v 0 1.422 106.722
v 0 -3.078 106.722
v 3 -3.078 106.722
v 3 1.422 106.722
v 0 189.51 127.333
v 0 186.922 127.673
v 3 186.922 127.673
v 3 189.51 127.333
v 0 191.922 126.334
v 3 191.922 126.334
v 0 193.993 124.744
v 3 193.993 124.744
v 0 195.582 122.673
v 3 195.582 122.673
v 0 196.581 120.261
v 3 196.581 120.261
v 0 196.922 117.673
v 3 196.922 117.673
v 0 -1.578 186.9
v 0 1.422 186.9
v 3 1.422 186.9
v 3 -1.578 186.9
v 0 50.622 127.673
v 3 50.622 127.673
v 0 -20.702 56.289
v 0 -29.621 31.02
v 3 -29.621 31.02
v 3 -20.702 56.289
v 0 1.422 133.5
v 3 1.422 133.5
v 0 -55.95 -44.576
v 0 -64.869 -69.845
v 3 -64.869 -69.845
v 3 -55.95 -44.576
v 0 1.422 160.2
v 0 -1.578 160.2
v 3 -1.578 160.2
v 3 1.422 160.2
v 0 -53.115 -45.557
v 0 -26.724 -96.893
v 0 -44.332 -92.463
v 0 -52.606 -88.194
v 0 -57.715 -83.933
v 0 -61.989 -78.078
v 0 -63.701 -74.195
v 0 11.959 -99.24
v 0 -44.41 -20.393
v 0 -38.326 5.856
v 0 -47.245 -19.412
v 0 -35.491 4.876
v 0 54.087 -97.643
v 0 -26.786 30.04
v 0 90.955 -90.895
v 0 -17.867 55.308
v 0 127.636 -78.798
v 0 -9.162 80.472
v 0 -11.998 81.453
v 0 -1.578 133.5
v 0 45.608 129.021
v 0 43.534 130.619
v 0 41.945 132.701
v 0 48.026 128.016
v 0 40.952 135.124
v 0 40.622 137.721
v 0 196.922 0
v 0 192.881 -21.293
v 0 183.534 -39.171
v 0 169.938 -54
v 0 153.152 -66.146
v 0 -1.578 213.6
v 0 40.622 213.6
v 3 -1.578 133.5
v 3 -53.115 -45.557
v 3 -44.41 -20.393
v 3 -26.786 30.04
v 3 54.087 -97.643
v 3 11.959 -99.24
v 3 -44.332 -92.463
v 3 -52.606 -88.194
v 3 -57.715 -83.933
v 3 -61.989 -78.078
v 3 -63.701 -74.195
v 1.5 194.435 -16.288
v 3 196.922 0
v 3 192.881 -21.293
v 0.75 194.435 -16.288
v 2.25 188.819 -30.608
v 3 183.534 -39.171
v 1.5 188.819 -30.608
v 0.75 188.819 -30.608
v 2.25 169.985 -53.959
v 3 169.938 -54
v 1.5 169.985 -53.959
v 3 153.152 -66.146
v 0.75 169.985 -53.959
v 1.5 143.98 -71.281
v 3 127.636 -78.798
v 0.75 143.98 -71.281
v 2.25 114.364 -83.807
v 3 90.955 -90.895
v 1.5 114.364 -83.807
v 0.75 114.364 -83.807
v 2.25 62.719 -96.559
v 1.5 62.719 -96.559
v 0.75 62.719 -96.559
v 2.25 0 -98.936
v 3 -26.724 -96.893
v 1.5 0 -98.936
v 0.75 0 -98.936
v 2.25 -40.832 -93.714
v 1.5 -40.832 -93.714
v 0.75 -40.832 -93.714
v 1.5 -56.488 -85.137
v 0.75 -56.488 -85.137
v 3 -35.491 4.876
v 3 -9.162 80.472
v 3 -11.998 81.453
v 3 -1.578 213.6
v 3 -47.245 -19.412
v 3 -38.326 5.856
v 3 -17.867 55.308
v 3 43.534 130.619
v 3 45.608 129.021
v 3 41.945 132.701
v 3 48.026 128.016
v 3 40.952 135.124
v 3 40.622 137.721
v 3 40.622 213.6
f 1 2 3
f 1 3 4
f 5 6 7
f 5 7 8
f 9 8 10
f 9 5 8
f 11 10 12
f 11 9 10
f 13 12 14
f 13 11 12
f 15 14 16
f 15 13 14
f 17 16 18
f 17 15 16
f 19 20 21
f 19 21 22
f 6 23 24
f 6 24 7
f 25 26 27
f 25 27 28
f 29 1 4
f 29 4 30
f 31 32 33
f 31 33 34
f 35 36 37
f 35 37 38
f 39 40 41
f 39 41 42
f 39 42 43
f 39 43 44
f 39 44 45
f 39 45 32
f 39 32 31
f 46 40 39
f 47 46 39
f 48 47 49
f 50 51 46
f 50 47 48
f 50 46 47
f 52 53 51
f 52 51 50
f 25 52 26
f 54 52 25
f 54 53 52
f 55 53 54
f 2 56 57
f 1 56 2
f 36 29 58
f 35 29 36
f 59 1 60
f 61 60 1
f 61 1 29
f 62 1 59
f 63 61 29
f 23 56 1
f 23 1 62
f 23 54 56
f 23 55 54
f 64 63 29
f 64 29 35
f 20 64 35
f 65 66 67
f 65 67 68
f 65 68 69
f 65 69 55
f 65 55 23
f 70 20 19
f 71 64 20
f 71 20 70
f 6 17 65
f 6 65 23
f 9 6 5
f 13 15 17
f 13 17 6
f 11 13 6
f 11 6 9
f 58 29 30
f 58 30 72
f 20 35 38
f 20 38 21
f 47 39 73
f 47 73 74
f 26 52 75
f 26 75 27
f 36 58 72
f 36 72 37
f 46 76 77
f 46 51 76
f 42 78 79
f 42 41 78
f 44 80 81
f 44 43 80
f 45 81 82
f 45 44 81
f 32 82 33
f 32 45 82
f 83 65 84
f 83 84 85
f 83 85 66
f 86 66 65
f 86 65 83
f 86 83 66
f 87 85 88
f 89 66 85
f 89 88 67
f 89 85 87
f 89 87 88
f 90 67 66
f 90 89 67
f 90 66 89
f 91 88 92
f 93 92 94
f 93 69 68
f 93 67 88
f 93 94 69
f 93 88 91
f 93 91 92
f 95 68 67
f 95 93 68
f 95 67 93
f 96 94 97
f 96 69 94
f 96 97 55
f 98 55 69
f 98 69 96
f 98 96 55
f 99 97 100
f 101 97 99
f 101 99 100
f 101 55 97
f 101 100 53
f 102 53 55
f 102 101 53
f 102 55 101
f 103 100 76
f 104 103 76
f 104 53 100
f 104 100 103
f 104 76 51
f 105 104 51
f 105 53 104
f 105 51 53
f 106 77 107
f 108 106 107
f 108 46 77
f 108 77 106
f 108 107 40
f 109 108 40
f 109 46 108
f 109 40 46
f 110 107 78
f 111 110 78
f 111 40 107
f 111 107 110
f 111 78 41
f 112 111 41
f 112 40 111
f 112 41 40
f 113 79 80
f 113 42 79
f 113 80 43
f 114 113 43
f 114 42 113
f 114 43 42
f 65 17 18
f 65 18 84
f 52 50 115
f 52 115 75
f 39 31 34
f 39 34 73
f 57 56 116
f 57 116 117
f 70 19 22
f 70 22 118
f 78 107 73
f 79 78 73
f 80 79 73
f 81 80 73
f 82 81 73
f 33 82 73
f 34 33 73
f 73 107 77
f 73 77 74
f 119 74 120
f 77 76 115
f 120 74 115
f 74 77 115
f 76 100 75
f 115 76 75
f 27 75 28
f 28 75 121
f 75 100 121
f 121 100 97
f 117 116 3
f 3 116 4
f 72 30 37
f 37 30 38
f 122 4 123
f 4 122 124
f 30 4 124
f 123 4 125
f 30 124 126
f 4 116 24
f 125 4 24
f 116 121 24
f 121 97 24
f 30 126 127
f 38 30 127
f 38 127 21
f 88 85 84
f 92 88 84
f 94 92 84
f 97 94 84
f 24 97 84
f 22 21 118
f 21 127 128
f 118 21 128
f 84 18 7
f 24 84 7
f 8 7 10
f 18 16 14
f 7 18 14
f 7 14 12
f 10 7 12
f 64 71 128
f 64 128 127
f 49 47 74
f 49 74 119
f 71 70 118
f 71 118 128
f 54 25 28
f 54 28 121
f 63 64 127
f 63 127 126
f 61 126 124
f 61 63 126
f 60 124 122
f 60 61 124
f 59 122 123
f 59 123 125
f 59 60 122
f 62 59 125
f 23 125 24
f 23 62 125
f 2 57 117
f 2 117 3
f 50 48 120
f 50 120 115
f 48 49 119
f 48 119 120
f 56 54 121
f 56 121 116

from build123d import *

# Parameters (mm, degrees)
BOSS_EXTRUDE1_DEPTH = 3


with BuildPart() as part:
    # Sketch1 → Boss-Extrude1 (new body)
    with BuildSketch(Plane(origin=(0, 0, 0), x_dir=(0, 0, -1), z_dir=(1, 0, 0))):
        with BuildLine():
            Line((-127.67328154, 50.621631606), (-127.67328154, 186.921746015))
            ThreePointArc((-127.67328154, 186.921746015), (-124.744349352, 193.992813827), (-117.67328154, 196.921746015))
            Line((-117.67328154, 196.921746015), (0, 196.921746015))
            add(Edge.make_bspline(
                [(0, 196.921746015), (46.196792572, 194.855720742), (79.88487553, 137.404046632), (99.182170179, 59.208836991), (100.052993092, 0.303625018), (95.624976693, -59.91038793), (69.844770806, -64.869245027)],
                knots=[0, 0, 0, 0, 0.394606227, 0.564234061, 0.764368842, 1, 1, 1, 1], degree=3))
            Line((69.844770806, -64.869245027), (44.576317349, -55.949963479))
            Line((44.576317349, -55.949963479), (45.557040507, -53.114794685))
            Line((45.557040507, -53.114794685), (20.392883459, -44.410173069))
            Line((20.392883459, -44.410173069), (19.412160301, -47.245341862))
            Line((19.412160301, -47.245341862), (-5.856293156, -38.326060314))
            Line((-5.856293156, -38.326060314), (-4.875569998, -35.490891521))
            Line((-4.875569998, -35.490891521), (-30.039727046, -26.786269904))
            Line((-30.039727046, -26.786269904), (-31.020450204, -29.621438697))
            Line((-31.020450204, -29.621438697), (-56.28890366, -20.702157149))
            Line((-56.28890366, -20.702157149), (-55.308180502, -17.866988356))
            Line((-55.308180502, -17.866988356), (-80.47233755, -9.162366739))
            Line((-80.47233755, -9.162366739), (-81.453060708, -11.997535533))
            Line((-81.453060708, -11.997535533), (-106.721514165, -3.078253985))
            Line((-106.721514165, -3.078253985), (-106.721514165, 1.421746015))
            Line((-106.721514165, 1.421746015), (-133.5, 1.421746015))
            Line((-133.5, 1.421746015), (-133.5, -1.578253985))
            Line((-133.5, -1.578253985), (-160.2, -1.578253985))
            Line((-160.2, -1.578253985), (-160.2, 1.421746015))
            Line((-160.2, 1.421746015), (-186.9, 1.421746015))
            Line((-186.9, 1.421746015), (-186.9, -1.578253985))
            Line((-186.9, -1.578253985), (-213.6, -1.578253985))
            Line((-213.6, -1.578253985), (-213.6, 40.621746015))
            Line((-213.6, 40.621746015), (-137.721116386, 40.621746015))
            ThreePointArc((-137.721116386, 40.621746015), (-130.619146174, 43.533671799), (-127.67328154, 50.621631606))
        make_face()
    extrude(amount=BOSS_EXTRUDE1_DEPTH)


solid = part.part
